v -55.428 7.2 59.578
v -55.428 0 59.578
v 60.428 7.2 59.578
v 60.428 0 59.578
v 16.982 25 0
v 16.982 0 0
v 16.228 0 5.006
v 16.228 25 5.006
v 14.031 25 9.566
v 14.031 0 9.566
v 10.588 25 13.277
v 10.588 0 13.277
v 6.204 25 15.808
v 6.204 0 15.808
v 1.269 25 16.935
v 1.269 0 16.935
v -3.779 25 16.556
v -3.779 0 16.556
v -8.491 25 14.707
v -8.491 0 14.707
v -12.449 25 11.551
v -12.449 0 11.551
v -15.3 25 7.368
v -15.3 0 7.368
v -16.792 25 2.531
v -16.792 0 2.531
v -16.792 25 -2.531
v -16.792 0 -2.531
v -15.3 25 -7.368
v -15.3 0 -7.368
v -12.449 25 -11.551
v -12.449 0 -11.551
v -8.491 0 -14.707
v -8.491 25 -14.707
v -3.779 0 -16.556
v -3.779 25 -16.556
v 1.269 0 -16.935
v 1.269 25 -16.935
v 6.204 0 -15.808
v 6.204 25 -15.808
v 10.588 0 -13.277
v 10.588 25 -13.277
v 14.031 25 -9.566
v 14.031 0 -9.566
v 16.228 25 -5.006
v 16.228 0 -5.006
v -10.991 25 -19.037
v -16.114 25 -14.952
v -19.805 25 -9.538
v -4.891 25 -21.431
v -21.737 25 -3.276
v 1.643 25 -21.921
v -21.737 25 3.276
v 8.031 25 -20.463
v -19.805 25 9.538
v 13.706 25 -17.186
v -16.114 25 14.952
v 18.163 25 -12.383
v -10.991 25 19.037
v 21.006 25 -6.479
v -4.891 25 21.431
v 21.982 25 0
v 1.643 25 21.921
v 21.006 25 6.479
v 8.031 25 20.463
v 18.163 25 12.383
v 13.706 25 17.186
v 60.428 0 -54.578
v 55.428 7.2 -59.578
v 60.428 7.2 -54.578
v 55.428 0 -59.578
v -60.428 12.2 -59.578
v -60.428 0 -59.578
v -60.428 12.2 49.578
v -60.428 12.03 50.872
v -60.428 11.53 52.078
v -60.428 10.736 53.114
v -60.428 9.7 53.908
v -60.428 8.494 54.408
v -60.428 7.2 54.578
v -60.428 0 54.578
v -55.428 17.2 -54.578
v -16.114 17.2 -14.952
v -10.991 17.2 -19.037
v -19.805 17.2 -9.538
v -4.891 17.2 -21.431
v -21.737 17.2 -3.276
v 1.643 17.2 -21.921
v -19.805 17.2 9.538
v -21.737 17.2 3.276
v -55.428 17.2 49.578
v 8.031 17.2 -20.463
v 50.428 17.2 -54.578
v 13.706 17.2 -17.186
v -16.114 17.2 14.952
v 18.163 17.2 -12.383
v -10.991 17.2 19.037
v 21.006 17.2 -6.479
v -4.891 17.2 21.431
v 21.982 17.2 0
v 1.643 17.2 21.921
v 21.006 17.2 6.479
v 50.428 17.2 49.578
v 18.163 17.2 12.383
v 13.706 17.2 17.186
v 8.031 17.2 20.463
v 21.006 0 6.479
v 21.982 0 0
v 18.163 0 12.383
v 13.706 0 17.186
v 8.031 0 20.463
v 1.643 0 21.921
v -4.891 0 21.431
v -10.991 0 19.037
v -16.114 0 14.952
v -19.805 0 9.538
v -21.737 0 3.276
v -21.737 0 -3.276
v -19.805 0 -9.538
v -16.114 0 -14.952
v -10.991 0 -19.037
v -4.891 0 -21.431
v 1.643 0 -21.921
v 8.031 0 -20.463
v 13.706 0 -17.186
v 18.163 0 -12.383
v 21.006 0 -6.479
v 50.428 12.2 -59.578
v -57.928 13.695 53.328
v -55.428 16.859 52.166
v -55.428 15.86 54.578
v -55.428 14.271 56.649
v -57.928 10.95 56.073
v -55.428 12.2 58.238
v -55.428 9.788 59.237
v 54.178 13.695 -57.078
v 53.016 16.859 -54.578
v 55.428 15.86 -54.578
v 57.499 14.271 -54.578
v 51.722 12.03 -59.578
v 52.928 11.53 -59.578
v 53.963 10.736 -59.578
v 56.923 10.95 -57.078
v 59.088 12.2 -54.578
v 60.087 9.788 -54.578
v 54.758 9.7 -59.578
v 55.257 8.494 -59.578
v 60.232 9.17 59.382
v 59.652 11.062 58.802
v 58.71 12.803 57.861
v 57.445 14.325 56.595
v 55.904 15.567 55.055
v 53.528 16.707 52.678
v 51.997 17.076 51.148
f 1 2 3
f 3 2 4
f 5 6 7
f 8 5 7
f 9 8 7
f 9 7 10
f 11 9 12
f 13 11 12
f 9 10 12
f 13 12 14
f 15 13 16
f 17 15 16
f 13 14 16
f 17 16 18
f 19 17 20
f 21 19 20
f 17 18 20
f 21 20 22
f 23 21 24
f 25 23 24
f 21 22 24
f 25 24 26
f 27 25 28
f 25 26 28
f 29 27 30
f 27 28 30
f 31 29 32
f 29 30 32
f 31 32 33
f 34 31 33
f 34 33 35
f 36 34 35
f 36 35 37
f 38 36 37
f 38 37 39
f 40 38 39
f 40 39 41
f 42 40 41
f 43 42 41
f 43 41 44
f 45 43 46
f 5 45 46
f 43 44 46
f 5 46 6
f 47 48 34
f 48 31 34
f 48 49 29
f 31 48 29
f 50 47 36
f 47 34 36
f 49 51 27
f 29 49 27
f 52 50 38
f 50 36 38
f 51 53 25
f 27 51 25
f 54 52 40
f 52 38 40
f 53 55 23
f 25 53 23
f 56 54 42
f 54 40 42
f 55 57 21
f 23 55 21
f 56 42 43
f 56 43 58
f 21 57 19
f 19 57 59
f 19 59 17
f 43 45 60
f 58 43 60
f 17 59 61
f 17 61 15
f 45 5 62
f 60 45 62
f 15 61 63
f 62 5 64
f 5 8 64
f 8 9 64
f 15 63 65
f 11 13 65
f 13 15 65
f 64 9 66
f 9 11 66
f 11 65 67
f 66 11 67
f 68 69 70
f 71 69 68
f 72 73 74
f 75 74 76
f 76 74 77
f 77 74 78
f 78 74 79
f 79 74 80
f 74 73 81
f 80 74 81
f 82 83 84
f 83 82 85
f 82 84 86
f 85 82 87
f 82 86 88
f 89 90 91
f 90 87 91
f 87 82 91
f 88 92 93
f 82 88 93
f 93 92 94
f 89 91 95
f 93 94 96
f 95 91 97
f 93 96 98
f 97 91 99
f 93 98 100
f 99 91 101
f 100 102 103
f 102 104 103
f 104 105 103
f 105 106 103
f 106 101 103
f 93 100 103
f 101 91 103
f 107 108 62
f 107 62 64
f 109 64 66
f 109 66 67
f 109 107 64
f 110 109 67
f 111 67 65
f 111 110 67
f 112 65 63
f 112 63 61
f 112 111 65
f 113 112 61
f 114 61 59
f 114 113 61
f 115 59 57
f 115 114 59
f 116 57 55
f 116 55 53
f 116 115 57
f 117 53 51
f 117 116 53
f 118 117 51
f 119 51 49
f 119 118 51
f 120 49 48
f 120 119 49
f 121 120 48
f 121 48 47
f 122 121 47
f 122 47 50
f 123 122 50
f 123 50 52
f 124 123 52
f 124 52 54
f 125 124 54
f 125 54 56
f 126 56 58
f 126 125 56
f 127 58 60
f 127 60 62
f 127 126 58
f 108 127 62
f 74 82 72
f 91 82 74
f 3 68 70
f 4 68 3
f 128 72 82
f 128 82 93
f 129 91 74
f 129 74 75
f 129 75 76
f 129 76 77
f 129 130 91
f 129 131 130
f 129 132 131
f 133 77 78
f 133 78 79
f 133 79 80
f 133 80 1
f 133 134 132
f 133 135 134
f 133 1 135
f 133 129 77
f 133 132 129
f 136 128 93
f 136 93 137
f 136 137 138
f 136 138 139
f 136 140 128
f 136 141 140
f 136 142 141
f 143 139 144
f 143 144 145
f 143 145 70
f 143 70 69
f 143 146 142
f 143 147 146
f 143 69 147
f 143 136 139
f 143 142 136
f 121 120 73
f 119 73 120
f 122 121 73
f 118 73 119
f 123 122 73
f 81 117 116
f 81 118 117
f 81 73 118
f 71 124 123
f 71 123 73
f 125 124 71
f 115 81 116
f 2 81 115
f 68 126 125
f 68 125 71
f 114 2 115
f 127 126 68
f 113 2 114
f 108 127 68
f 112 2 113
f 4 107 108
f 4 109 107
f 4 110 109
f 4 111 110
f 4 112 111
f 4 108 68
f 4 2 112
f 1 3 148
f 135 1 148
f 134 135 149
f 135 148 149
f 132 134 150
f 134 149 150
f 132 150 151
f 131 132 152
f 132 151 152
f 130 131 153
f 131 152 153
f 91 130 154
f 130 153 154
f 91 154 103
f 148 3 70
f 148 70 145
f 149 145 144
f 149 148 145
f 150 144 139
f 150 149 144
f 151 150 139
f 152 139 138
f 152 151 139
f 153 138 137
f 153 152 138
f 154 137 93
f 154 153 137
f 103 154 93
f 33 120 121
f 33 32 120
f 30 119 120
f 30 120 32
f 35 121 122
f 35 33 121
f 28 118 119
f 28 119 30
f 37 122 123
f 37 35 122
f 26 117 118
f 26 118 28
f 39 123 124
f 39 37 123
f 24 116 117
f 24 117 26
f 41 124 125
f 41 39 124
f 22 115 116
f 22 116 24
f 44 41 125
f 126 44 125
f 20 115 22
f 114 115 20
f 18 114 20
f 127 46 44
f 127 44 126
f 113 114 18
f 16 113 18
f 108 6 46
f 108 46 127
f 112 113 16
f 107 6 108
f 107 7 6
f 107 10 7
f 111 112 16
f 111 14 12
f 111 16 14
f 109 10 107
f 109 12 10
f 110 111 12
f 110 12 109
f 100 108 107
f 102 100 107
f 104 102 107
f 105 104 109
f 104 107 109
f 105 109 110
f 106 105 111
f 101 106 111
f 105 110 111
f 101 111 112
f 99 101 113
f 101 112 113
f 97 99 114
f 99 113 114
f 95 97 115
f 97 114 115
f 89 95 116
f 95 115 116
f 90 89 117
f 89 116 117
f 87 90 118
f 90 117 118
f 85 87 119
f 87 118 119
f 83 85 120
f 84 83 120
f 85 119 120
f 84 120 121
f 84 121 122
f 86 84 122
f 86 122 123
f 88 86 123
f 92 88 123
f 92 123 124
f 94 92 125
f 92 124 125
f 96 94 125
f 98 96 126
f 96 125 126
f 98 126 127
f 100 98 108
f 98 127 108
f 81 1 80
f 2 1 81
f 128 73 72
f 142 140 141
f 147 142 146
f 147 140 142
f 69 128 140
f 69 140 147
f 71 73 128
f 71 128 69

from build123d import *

# Parameters (mm, degrees)
F0_W     = 120.855168
F0_H     = 119.156398
F0_R     = 21.982176
F1_DEPTH = 17.2
F2_R     = 21.982176
F2_R_2   = 16.982176
F3_DEPTH = 25
F4_R     = 10
F5_SIZE  = 5


with BuildPart() as f1:
    # F0 (on Front) → F1 (new body)
    with BuildSketch(Plane.XZ):
        Rectangle(F0_W, F0_H)
        Circle(F0_R, mode=Mode.SUBTRACT)
    extrude(amount=-F1_DEPTH)

    # F4
    f4_edges = [f1.edges().sort_by_distance(p)[0] for p in [
        (0, 17.2, 59.578199),
        (60.427584, 17.2, 0),
    ]]
    fillet(f4_edges, radius=F4_R)

    # F5
    f5_edges = [f1.edges().sort_by_distance(p)[0] for p in [
        (-60.427584, 17.2, -5),
        (-5, 17.2, -59.578199),
    ]]
    chamfer(f5_edges, length=F5_SIZE)


with BuildPart() as f3:
    # F2 (on Front) → F3 (new body)
    with BuildSketch(Plane.XZ):
        Circle(F2_R)
        Circle(F2_R_2, mode=Mode.SUBTRACT)
    extrude(amount=-F3_DEPTH)


solid = Compound([f1.part, f3.part])
